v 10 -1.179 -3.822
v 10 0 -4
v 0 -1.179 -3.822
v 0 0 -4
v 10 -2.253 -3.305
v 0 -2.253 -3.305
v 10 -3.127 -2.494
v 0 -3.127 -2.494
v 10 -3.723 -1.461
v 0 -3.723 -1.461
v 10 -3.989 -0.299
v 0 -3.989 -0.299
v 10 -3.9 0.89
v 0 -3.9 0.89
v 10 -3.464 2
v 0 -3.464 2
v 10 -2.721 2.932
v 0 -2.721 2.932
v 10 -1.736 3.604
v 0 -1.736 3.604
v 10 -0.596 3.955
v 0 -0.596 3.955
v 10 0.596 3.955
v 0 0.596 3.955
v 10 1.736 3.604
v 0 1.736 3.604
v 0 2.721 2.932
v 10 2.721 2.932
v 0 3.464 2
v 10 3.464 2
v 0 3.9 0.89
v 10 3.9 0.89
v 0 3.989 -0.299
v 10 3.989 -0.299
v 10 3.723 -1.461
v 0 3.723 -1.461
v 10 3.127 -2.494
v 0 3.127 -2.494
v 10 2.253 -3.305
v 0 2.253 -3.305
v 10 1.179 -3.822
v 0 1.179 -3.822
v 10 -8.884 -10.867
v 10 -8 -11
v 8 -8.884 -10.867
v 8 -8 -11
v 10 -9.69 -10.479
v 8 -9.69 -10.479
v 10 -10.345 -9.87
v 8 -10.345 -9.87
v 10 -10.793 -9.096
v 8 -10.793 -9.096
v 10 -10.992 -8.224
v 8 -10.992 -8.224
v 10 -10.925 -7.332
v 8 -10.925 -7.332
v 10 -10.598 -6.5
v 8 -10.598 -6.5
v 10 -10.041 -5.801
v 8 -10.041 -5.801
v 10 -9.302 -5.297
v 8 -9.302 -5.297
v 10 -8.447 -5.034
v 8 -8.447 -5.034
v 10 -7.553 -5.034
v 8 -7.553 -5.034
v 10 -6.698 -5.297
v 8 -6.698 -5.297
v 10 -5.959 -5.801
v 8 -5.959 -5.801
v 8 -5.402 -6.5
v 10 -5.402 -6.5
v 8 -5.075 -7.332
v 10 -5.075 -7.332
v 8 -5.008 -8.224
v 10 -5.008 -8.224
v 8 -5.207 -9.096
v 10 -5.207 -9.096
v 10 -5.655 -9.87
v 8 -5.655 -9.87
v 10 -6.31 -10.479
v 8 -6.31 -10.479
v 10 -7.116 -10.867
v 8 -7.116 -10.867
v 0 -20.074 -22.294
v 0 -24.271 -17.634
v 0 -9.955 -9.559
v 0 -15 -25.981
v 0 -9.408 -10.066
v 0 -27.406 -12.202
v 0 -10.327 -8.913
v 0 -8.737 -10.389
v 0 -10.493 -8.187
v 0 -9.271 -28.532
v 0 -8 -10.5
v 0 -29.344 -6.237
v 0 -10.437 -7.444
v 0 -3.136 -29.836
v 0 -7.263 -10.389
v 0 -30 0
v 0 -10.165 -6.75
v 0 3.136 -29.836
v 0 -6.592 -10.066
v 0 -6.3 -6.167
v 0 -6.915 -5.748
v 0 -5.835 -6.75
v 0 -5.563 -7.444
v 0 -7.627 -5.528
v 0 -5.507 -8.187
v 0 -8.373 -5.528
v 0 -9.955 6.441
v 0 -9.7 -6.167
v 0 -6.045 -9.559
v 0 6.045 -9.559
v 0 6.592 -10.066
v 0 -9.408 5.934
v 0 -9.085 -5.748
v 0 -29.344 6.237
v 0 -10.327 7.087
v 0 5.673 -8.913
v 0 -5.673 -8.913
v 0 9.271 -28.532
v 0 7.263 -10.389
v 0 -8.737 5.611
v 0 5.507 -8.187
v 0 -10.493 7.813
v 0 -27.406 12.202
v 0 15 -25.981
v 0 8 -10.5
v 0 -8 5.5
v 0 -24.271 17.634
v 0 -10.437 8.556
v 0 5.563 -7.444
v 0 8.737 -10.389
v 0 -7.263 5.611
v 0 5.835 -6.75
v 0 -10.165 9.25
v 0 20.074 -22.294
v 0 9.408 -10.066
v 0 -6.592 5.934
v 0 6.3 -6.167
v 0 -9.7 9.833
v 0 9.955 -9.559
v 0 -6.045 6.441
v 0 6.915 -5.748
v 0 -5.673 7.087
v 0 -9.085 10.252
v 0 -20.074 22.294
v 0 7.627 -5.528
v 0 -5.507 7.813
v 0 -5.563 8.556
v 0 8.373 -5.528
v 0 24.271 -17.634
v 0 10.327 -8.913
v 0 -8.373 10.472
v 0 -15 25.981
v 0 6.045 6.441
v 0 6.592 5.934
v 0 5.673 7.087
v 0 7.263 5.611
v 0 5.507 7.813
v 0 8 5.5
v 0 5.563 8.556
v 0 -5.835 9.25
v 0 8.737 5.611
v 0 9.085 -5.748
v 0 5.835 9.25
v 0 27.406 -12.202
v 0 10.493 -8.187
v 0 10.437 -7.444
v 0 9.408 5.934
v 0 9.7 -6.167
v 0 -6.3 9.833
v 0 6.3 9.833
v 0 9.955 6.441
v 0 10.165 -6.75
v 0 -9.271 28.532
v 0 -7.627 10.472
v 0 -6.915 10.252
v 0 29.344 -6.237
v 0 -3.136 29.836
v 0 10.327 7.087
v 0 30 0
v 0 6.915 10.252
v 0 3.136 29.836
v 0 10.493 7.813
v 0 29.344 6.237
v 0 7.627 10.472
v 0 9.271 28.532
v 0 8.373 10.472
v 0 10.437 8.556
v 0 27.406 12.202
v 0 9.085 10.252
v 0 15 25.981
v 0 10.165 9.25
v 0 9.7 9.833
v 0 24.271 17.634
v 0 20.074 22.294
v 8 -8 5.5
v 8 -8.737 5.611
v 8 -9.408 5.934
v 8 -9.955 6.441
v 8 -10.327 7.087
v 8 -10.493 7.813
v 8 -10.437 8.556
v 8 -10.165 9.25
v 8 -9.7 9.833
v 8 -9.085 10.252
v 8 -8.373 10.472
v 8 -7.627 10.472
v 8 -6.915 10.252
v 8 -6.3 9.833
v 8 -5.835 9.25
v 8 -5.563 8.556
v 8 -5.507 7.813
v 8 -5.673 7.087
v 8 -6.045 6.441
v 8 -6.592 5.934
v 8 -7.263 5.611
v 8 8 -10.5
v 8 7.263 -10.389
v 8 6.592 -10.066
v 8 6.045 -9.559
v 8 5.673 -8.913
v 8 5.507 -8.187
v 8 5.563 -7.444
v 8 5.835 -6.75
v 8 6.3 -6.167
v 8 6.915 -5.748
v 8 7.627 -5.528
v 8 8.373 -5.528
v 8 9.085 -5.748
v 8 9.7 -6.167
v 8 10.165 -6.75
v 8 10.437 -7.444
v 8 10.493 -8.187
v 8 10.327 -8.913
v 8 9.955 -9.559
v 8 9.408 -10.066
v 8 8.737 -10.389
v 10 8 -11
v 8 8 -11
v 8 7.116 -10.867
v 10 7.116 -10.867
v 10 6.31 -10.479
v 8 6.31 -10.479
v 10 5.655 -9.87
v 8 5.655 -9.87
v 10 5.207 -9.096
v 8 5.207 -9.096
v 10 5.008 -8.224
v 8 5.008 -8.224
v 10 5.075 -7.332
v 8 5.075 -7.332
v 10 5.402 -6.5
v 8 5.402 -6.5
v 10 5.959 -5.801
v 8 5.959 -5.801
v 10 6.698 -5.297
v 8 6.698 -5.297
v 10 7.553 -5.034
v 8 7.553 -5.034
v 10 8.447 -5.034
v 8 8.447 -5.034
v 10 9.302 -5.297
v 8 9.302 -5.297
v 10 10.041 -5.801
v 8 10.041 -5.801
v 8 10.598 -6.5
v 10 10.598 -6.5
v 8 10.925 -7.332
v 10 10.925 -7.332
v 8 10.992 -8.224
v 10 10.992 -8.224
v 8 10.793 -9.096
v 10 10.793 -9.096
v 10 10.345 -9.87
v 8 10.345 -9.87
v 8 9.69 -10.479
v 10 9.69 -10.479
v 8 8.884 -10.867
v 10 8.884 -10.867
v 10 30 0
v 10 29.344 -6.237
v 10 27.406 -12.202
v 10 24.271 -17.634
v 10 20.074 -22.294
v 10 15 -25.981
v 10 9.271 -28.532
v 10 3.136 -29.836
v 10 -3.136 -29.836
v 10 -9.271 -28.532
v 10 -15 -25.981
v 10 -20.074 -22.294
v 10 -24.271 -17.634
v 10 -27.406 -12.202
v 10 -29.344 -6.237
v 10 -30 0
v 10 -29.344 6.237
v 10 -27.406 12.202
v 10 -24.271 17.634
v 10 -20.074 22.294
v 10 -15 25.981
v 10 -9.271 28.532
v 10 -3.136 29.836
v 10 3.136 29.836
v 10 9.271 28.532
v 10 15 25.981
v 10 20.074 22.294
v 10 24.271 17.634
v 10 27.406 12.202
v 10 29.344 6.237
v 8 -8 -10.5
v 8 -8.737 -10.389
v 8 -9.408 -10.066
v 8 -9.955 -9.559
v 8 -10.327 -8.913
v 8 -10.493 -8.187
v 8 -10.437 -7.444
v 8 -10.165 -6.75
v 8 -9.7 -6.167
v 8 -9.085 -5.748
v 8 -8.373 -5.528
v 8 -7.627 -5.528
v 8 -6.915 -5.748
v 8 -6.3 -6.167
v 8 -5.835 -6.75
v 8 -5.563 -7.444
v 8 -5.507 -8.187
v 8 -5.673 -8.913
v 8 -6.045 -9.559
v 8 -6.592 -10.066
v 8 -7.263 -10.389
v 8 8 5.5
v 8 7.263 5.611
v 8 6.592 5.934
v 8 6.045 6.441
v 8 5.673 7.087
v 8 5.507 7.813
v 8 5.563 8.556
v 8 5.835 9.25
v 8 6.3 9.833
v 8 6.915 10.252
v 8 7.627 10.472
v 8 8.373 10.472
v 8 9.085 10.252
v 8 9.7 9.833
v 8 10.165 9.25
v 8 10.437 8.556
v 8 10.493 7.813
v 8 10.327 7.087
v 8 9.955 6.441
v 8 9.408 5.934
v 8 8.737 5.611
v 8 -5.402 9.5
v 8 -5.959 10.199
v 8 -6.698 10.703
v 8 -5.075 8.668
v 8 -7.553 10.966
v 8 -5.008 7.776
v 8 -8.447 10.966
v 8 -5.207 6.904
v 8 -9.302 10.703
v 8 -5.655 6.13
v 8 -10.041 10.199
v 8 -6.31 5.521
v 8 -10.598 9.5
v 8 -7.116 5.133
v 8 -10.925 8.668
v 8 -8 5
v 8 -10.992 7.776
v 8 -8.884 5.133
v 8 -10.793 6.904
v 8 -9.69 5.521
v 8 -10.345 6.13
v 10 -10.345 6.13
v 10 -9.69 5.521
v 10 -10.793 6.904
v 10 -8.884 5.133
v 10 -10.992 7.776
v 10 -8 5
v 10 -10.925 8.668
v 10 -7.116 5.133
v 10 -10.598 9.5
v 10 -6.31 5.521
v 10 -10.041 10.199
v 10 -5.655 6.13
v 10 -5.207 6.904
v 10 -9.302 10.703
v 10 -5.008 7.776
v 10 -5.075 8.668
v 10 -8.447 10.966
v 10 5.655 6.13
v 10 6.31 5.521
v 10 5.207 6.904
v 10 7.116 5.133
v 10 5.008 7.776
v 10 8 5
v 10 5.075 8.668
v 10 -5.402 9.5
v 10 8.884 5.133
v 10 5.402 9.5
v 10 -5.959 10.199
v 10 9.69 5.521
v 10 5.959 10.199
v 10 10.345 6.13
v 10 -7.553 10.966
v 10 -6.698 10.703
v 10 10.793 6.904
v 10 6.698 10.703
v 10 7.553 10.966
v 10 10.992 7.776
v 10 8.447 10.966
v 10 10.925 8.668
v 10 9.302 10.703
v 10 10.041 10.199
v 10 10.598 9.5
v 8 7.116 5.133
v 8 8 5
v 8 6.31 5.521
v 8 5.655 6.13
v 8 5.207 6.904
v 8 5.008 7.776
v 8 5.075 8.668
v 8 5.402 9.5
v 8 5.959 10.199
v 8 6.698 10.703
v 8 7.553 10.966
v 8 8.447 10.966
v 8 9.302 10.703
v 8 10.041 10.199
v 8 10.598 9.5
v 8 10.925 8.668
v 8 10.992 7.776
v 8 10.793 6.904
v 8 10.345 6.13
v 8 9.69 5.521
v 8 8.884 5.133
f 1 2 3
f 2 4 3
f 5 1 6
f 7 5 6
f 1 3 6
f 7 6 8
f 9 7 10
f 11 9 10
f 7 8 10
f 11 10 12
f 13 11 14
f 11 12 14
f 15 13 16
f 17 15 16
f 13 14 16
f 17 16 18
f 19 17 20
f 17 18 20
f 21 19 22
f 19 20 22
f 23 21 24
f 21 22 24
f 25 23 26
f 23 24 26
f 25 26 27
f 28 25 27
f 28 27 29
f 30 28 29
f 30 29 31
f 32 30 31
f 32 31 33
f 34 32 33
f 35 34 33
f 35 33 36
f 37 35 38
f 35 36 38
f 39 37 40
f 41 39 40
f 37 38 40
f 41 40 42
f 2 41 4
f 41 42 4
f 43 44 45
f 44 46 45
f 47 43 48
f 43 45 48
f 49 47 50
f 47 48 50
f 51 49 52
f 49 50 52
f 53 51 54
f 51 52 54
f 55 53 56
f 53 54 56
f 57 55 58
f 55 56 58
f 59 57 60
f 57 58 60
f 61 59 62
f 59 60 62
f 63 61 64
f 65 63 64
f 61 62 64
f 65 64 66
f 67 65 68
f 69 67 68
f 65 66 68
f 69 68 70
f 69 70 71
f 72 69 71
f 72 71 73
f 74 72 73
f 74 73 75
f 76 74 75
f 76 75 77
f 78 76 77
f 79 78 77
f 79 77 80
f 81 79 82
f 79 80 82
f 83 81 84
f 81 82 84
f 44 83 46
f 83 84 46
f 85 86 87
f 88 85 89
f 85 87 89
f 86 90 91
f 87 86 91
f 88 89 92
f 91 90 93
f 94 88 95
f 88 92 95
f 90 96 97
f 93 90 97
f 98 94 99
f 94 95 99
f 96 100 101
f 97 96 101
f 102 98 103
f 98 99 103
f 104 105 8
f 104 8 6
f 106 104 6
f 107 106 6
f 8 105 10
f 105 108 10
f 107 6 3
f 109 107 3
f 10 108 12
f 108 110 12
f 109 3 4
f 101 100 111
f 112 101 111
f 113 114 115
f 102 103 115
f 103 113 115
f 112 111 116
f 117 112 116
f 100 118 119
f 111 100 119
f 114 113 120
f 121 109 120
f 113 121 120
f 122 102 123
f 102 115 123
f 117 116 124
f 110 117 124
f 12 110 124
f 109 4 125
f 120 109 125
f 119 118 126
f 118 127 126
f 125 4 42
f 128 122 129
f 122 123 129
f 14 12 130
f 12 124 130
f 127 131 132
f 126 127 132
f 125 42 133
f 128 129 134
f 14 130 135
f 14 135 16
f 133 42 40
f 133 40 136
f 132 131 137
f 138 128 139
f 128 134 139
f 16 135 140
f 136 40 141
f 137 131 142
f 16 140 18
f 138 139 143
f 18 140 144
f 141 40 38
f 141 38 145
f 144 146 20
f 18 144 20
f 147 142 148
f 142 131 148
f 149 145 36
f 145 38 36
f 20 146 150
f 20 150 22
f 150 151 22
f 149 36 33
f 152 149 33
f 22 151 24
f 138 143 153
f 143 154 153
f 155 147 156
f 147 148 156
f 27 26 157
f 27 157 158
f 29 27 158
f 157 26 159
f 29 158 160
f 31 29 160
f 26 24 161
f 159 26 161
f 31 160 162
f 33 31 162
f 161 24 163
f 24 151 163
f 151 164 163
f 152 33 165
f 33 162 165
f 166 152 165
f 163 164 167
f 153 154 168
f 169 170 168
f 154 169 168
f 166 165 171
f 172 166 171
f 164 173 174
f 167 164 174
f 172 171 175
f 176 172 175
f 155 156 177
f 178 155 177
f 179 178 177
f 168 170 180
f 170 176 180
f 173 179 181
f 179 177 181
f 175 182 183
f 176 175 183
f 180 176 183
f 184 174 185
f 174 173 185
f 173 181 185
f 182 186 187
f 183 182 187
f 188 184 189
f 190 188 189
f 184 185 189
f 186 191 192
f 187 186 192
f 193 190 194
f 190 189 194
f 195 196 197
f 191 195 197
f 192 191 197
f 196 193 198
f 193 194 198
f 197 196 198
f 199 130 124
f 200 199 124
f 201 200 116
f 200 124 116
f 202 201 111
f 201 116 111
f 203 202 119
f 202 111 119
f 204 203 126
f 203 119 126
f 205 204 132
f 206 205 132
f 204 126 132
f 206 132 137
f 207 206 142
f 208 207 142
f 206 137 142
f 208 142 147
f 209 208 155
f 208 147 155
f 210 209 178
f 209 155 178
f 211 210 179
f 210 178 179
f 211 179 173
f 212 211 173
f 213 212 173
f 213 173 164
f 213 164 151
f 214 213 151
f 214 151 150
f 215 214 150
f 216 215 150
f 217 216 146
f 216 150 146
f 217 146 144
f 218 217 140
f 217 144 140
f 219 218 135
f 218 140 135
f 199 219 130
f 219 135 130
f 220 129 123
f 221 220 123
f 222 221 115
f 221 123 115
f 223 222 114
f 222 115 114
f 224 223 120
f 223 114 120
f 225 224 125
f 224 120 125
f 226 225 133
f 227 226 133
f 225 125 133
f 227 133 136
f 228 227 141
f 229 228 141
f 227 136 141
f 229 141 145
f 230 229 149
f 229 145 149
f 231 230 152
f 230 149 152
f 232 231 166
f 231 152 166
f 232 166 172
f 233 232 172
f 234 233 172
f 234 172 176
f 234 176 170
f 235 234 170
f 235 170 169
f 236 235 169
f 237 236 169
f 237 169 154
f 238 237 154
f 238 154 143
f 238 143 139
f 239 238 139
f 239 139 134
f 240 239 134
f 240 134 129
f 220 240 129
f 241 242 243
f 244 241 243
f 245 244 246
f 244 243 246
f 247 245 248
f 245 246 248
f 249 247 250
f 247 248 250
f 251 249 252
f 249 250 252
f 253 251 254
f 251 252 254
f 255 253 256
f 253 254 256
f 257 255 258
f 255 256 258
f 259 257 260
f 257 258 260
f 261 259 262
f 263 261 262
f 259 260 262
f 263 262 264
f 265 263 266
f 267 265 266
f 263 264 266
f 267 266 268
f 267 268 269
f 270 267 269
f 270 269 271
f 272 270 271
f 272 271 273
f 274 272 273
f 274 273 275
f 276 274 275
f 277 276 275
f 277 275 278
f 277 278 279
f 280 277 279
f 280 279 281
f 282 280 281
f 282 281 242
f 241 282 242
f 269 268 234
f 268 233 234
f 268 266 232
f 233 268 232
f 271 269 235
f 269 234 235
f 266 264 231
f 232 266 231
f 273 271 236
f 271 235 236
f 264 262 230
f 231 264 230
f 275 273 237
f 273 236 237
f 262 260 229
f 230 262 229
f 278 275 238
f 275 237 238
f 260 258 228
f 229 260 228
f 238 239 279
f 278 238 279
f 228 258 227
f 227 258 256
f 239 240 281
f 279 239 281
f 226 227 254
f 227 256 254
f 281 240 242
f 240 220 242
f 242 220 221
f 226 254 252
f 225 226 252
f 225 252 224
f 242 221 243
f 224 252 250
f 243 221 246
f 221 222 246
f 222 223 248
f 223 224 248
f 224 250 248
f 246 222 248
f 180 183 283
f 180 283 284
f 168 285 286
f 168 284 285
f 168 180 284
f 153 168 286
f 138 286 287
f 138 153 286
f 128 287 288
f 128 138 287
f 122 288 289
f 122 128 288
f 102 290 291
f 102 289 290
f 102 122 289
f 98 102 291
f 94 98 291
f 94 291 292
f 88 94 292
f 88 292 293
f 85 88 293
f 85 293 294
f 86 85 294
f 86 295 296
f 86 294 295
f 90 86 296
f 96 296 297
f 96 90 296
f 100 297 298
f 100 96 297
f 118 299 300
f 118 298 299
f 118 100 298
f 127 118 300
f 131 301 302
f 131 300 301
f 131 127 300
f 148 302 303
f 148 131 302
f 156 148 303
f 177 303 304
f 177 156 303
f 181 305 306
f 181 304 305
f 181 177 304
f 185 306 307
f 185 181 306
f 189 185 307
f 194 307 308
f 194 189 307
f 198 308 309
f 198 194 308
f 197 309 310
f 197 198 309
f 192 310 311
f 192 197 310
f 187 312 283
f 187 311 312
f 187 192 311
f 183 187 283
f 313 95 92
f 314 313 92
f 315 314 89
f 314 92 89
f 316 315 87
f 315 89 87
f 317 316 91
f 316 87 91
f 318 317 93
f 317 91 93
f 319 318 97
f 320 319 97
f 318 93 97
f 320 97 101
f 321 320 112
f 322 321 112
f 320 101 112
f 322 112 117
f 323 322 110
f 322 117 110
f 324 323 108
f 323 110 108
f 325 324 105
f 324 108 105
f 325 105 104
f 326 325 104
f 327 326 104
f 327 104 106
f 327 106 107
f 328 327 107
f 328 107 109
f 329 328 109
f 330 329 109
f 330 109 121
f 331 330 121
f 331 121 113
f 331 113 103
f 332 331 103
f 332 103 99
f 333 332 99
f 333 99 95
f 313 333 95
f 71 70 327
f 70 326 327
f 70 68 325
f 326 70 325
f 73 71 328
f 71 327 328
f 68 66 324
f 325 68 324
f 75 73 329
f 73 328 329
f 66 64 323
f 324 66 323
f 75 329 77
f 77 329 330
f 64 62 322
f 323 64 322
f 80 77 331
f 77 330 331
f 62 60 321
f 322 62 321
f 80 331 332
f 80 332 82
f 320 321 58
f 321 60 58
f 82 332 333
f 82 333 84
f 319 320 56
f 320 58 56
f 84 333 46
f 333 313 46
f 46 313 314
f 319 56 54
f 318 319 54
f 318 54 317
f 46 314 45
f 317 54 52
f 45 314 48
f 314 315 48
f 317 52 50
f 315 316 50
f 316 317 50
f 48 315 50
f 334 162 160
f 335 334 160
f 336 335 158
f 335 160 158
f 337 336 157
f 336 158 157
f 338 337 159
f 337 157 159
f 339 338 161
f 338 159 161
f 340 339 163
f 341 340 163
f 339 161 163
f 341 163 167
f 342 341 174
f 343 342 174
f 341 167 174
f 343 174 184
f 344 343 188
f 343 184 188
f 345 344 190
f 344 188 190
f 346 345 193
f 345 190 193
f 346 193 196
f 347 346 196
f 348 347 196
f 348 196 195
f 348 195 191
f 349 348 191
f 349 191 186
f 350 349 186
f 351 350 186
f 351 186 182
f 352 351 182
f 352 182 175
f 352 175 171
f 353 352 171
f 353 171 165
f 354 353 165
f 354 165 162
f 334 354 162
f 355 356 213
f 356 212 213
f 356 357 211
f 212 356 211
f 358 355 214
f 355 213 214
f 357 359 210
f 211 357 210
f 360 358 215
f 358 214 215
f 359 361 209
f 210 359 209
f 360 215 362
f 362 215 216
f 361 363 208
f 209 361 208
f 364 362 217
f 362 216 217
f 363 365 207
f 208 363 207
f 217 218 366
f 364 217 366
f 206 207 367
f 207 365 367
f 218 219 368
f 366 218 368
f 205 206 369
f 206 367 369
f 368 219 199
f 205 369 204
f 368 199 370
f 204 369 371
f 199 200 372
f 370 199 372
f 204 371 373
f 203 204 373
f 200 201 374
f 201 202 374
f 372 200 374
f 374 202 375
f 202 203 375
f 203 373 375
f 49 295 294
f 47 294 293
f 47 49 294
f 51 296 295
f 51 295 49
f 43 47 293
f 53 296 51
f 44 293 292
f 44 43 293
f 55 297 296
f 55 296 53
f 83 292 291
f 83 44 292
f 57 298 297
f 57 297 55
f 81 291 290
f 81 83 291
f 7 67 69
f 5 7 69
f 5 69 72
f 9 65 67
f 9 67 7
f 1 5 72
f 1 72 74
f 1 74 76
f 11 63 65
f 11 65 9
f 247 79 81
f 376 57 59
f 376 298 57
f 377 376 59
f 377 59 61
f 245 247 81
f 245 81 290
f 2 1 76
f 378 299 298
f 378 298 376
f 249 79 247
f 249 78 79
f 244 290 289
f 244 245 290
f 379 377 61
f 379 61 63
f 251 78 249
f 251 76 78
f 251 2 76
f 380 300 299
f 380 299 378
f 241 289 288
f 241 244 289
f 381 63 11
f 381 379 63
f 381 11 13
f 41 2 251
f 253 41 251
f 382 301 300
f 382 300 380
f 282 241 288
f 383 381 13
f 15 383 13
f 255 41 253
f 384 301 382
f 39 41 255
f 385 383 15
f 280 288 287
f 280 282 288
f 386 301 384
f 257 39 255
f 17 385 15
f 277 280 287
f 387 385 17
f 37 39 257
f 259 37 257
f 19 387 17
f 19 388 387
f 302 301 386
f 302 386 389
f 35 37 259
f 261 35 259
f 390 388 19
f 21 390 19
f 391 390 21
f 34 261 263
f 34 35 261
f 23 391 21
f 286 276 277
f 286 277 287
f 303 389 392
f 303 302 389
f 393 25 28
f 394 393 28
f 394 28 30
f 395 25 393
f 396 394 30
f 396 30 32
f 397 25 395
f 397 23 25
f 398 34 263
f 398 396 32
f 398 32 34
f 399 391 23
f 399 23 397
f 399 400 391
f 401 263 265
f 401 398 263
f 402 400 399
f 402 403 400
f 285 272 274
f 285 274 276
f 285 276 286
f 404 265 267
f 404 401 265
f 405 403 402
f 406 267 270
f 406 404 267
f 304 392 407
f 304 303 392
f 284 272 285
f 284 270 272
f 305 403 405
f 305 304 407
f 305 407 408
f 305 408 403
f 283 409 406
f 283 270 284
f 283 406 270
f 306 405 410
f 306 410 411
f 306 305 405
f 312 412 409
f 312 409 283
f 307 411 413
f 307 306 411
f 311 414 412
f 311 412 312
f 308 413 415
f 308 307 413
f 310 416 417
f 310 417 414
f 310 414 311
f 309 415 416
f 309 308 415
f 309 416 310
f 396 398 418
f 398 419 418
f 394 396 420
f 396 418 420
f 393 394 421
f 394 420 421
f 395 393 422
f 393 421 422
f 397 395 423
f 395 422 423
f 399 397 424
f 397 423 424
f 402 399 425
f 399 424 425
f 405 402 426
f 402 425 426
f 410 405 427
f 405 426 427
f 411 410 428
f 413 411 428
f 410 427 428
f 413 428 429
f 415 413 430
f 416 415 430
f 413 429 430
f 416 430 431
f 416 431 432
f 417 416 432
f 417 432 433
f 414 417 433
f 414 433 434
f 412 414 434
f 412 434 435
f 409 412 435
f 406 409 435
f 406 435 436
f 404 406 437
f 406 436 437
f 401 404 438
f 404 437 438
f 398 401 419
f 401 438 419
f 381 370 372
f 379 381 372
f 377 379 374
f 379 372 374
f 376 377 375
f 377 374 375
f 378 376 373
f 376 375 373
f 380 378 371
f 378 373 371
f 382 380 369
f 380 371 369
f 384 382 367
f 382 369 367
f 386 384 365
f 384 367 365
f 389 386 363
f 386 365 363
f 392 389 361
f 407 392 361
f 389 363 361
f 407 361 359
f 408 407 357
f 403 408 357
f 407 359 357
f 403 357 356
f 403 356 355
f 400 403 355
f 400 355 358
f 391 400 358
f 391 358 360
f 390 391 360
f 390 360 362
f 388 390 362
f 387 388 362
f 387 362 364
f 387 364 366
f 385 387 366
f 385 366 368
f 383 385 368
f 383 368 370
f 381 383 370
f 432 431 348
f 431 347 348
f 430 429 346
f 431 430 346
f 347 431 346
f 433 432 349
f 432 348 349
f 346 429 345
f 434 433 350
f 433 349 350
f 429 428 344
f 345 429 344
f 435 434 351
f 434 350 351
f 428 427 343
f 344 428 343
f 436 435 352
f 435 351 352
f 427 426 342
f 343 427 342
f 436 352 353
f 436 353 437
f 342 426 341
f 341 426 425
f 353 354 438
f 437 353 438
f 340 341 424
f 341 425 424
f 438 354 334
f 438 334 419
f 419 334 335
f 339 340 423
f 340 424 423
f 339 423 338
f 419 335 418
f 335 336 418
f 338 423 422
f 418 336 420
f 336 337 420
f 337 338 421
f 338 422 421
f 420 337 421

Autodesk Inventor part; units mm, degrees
ref_plane "YZ Plane" through (0, 0, 0) normal (1, 0, 0) x (0, 1, 0)
ref_plane "XZ Plane" through (0, 0, 0) normal (0, 1, 0) x (-1, 0, 0)
ref_plane "XY Plane" through (0, 0, 0) normal (0, 0, 1) x (1, 0, 0)
sketch "Sketch1" plane through (0, 0, 0) normal (1, 0, 0) x (0, 1, 0)
  circle A0 centre (0, 0) radius 30
  circle A1 centre (0, 0) radius 30 projected
  dimension "d0" = 60
  dimension "d22" = 60
extrude "Extrusion1" add sketch "Sketch1" along normal blind 10
sketch "Sketch2" plane through (10, 0, 0) normal (1, 0, 0) x (0, 0, -1)
  point P0 (0, 0)
  point P1 (-8, 8)
  point P2 (8, 8)
  point P3 (8, -8)
  point P4 (-8, -8)
  dimension "d3" = 8
  dimension "d4" = 8
  dimension "d5" = 16
  dimension "d6" = 16
hole "Hole1" at (10, 8, 8) at (10, 8, -8) at (10, -8, -8) at (10, -8, 8) direction (-1, 0, 0) diameter 5 end through all counterbore diameter 6 counterbore depth 2
sketch "Sketch3" plane through (10, 0, 0) normal (1, 0, 0) x (0, 0, -1)
  point P0 (0, 0)
  point P1 (0, 0)
hole "Hole2" at (10, 0, 0) direction (-1, 0, 0) diameter 8 end through all
equation "\"d0\" = d22"
equation "\"d5\" = 2 * d3"
equation "\"d6\" = d5"
properties part number "Tapon 1"
